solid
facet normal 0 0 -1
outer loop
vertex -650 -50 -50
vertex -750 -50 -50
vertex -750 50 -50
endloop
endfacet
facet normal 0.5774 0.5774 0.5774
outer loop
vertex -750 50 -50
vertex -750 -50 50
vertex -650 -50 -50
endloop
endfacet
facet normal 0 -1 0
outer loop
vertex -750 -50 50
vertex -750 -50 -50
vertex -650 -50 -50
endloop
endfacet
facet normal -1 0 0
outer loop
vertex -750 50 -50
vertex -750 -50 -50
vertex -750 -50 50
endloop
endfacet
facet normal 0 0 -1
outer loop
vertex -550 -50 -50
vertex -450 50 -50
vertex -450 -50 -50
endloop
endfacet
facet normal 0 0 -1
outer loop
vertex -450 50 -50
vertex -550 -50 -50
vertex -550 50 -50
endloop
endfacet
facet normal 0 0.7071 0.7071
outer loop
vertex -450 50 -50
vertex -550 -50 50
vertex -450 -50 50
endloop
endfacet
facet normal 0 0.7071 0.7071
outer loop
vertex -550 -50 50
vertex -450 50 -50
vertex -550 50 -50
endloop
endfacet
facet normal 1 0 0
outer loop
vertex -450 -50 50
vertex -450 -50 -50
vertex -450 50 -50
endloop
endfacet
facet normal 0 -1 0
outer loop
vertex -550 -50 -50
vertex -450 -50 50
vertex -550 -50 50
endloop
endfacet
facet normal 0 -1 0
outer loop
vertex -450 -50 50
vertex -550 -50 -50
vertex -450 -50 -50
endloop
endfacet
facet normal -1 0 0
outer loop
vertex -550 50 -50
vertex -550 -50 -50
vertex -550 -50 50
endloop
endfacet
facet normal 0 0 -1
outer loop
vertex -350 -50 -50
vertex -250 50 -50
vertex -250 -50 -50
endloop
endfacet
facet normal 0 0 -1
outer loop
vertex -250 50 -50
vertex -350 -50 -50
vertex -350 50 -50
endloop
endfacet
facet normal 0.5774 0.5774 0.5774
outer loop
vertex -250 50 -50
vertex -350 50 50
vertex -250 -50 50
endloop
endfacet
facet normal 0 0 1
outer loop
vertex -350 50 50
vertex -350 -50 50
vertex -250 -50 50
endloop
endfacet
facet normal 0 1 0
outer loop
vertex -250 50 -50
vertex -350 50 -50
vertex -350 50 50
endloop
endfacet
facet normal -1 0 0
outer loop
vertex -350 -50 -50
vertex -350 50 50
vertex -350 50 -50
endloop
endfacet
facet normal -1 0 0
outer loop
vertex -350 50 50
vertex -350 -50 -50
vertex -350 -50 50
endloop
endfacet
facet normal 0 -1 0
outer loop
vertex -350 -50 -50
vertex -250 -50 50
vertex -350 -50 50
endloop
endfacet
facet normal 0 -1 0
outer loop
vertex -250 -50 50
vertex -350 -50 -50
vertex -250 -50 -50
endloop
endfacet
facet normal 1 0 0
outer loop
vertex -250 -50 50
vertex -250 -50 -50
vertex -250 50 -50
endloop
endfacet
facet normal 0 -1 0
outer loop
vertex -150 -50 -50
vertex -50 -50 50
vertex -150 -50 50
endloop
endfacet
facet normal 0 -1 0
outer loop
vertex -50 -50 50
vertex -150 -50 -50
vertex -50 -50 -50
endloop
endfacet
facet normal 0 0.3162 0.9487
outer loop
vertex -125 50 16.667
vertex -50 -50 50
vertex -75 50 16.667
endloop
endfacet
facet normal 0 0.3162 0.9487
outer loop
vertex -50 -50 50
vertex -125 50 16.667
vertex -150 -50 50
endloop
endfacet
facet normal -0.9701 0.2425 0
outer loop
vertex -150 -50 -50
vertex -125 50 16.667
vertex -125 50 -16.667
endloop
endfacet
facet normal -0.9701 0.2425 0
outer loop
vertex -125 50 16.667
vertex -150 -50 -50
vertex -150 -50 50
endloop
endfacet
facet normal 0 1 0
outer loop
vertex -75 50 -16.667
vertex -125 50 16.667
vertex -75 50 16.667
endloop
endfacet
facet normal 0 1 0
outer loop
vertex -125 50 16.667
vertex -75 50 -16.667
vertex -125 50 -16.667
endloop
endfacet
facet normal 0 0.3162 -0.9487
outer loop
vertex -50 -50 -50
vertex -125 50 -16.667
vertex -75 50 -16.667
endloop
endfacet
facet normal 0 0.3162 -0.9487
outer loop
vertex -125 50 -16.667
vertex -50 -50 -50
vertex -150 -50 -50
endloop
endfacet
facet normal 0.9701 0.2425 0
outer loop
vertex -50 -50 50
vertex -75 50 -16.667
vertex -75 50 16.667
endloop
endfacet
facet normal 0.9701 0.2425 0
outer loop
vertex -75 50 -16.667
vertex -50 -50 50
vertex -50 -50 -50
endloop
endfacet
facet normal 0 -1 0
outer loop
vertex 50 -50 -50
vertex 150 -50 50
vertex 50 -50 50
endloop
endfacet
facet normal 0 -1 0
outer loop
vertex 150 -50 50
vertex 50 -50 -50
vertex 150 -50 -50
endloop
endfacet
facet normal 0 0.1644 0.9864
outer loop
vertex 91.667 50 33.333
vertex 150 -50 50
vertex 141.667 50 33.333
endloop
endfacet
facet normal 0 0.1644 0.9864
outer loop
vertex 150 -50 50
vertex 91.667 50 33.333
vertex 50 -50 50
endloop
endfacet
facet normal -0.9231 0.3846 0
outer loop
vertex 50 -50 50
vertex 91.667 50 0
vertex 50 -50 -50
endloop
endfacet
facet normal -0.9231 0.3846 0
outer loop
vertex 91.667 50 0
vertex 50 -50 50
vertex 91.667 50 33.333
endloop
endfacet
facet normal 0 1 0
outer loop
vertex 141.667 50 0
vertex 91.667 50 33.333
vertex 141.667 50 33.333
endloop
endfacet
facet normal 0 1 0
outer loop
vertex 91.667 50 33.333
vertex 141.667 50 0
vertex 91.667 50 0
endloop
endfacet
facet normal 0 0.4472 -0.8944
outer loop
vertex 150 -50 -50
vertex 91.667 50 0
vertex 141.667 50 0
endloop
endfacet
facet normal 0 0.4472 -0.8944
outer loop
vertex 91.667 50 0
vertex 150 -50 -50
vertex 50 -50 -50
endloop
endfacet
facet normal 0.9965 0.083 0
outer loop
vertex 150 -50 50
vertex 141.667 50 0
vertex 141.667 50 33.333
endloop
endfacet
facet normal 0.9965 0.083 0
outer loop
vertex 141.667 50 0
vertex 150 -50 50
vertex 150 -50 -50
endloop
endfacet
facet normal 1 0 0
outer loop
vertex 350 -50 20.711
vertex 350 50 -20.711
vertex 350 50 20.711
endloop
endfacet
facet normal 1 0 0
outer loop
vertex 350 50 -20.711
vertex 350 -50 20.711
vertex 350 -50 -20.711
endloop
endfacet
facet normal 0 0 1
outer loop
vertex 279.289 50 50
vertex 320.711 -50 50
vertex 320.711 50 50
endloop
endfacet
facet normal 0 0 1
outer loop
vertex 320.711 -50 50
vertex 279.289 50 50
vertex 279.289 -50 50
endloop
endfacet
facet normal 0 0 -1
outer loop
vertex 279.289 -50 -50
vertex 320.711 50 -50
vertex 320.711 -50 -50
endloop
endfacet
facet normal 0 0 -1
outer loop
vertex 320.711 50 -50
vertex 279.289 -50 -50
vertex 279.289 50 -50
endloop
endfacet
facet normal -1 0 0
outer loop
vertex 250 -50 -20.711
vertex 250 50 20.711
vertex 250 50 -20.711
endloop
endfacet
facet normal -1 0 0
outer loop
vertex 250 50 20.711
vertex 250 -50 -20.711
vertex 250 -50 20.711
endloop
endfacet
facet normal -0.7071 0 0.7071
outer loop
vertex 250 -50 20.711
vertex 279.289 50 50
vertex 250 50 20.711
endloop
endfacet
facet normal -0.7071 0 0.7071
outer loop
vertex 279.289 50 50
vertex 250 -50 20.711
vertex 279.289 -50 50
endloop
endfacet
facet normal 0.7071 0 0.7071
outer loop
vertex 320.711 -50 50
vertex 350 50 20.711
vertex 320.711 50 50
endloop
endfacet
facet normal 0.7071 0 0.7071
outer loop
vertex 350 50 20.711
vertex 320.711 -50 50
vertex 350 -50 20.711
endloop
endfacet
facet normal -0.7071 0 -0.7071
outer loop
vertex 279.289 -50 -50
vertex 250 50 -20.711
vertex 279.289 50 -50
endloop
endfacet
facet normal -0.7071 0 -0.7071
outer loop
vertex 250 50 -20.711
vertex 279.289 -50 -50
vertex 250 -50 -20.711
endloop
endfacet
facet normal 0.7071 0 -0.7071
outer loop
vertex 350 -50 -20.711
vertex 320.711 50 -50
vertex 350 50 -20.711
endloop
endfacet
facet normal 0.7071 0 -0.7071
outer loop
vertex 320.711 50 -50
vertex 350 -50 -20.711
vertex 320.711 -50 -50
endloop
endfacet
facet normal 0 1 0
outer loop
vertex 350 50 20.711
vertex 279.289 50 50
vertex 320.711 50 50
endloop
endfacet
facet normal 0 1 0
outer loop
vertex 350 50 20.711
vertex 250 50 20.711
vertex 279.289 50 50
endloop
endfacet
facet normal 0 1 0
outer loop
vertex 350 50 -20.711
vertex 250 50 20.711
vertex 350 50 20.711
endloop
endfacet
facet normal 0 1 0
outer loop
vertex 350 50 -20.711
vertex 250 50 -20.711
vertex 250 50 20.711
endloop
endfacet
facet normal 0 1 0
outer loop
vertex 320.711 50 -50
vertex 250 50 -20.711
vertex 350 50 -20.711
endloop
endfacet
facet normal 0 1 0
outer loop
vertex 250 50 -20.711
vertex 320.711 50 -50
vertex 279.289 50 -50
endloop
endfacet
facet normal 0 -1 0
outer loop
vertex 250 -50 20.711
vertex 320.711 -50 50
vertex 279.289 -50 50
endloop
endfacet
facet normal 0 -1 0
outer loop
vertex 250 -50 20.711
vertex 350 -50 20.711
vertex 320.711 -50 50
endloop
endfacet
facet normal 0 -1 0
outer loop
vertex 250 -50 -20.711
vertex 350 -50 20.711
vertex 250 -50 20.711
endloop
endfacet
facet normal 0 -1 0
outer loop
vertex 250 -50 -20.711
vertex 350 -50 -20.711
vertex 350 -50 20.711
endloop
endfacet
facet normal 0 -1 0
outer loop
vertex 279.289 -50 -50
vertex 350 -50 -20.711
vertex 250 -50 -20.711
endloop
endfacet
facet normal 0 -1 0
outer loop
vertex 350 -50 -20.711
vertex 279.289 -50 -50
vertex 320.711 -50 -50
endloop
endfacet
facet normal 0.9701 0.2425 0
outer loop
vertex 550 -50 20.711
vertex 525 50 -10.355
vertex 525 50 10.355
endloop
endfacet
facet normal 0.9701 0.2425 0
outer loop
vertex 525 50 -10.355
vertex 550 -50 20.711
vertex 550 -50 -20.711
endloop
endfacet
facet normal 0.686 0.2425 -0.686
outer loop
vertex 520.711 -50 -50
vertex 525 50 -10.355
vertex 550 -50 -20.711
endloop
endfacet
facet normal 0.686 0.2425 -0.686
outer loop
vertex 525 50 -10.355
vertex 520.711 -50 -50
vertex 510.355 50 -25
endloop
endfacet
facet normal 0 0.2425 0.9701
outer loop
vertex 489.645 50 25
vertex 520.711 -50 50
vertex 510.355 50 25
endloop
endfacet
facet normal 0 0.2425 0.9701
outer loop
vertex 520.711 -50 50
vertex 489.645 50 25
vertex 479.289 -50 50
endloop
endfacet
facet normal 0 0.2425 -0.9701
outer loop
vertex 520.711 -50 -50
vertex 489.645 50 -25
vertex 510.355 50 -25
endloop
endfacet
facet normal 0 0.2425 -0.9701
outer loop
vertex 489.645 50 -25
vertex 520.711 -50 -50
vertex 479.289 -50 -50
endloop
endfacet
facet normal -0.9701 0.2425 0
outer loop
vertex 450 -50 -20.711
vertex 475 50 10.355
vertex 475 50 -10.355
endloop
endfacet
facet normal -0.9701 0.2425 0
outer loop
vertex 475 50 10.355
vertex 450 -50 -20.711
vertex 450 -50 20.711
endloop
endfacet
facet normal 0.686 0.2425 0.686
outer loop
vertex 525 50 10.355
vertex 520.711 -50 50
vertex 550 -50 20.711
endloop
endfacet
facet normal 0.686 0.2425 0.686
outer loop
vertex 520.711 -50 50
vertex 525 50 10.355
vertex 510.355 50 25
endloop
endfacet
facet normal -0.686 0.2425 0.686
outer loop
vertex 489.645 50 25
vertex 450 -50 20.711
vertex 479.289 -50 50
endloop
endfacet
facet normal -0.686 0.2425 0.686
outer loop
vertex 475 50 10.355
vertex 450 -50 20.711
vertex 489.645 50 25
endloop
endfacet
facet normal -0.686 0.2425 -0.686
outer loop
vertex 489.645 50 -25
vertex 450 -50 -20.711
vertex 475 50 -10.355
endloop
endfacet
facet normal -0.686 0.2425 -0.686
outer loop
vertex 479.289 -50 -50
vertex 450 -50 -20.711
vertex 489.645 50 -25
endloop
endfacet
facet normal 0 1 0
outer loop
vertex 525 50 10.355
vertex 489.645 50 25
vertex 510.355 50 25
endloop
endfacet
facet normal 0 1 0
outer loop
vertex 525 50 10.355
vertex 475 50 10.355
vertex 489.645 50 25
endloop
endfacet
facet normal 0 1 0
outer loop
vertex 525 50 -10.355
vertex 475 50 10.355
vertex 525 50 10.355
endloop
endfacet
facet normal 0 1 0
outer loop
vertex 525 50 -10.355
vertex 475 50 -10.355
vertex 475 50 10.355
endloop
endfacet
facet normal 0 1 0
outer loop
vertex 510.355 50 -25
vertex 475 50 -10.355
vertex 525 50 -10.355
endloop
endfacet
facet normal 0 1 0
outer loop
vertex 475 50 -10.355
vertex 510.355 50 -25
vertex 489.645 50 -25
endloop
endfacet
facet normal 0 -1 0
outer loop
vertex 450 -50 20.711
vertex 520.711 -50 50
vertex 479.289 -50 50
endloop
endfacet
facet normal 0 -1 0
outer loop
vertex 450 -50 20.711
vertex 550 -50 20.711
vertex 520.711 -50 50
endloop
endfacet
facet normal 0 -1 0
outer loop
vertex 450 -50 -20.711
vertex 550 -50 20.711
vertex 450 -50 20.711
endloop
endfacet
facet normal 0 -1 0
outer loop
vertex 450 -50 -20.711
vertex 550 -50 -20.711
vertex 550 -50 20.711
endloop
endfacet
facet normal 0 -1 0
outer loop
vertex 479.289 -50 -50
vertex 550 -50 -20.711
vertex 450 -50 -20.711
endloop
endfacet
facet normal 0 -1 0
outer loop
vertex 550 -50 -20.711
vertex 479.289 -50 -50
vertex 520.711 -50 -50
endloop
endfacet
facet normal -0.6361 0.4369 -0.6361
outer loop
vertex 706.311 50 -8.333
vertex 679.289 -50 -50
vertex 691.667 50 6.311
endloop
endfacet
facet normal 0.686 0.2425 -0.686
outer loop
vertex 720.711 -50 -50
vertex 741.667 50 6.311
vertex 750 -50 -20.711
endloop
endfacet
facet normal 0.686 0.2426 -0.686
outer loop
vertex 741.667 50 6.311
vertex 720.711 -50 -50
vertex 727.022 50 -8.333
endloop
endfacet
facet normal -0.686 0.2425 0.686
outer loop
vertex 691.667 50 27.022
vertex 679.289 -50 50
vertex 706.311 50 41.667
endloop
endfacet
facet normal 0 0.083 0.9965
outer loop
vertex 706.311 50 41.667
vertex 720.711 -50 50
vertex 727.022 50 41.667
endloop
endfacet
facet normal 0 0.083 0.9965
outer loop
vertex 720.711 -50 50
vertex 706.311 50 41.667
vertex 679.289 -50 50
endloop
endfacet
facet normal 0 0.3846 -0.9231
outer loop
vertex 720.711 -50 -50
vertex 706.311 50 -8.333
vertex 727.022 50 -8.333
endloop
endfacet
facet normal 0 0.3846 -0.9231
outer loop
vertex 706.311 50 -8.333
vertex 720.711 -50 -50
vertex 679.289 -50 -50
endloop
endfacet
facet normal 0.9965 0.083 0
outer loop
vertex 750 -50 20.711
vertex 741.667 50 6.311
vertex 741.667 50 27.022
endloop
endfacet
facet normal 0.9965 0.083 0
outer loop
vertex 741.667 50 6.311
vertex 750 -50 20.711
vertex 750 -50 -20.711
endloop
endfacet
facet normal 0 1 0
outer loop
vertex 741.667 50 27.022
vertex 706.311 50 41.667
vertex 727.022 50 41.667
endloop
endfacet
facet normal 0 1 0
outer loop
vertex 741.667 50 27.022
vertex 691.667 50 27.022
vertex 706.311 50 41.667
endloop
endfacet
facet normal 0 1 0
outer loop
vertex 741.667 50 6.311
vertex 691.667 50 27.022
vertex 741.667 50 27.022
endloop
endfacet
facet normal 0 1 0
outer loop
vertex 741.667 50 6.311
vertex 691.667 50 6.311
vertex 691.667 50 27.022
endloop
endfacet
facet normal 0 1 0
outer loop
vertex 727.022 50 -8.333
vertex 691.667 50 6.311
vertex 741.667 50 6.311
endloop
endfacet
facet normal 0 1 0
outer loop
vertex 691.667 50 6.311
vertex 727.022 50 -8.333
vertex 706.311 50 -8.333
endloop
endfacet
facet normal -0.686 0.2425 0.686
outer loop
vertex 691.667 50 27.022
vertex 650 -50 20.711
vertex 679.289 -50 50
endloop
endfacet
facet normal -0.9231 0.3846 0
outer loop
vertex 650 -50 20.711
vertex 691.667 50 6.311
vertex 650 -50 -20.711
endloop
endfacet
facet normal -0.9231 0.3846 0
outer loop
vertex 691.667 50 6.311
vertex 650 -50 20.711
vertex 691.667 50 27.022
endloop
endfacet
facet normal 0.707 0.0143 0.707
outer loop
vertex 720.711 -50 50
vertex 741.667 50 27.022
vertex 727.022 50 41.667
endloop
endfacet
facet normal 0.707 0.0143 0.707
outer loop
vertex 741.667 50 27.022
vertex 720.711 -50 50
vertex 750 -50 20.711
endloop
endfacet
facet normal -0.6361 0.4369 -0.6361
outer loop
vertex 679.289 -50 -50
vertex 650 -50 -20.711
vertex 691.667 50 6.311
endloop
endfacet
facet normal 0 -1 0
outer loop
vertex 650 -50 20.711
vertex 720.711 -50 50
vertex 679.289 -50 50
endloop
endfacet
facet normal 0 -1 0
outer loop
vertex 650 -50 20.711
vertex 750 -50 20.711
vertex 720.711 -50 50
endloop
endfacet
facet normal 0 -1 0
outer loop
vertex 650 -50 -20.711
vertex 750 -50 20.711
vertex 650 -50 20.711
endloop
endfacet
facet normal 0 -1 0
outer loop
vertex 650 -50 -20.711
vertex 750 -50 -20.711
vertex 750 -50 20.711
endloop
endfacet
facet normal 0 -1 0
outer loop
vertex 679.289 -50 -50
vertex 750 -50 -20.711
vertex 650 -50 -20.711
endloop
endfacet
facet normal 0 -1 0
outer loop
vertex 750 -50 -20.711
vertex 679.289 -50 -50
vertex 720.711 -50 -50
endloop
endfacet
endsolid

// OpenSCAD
// basic shapes and a demo at the end

module sixth_cube() {
    /*
    like a unit cube centred at [0, 0, 0]
    but 5/6 sliced away from top front right along 3 vertices;
    faces:
        3 isosceles right triangles
        1 equilateral     triangle
    */
    a = 1/2;
    polyhedron(
        [
            [-a, -a, -a],
            [ a, -a, -a],
            [-a,  a, -a],
            [-a, -a,  a],
        ],
        [
            [0, 1, 2],
            [0, 2, 3],
            [0, 3, 1],
            [1, 3, 2],
        ]
    );
}

module half_cube() {
    /*
    like a unit cube centred at [0, 0, 0]
    but 1/2 sliced away from top front along 4 vertices;
    faces:
        2 squares
        1 rectangle
        2 isosceles right triangles
    */
    a = 1/2;
    polyhedron(
        [
            [-a, -a, -a],
            [ a, -a, -a],
            [-a,  a, -a],
            [ a,  a, -a],
            [-a, -a,  a],
            [ a, -a,  a],
        ],
        [
            [0, 1, 3, 2],
            [0, 2, 4],
            [0, 4, 5, 1],
            [1, 5, 3],
            [2, 3, 5, 4],
        ]
    );
}

module five_sixths_cube() {
    /*
    like a unit cube centred at [0, 0, 0]
    but 1/6 sliced away from top front right along 3 vertices;
    faces:
        3 squares
        3 isosceles right triangles
        1 equilateral     triangle
    */
    a = 1/2;
    polyhedron(
        [
            [-a, -a, -a],
            [ a, -a, -a],
            [-a,  a, -a],
            [ a,  a, -a],
            [-a, -a,  a],
            [ a, -a,  a],
            [-a,  a,  a],
        ],
        [
            [0, 1, 3, 2],
            [0, 2, 6, 4],
            [0, 4, 5, 1],
            [1, 5, 3],
            [2, 3, 6],
            [3, 5, 6],
            [4, 6, 5],
        ]
    );
}

module right_rect_frustum(fw, fh) {
    /*
    a right frustum of a rectangular pyramid
    (a right rectangular pyramid cut by a plane parallel to the base);
    base towards viewer;
    four of the faces are vertical;
    rear width = rear height = length = 1;
    centered at [0, 0, 0];
    faces:
        2 rectangles (front and rear)
        4 trapezoids
    args:
        fw = front width
        fh = front height
    */
    polyhedron(
        [
            // rear
            [ -1/2, -1/2,  -1/2],
            [ -1/2, -1/2,   1/2],
            [  1/2, -1/2,   1/2],
            [  1/2, -1/2,  -1/2],
            // front
            [-fw/2,  1/2, -fh/2],
            [-fw/2,  1/2,  fh/2],
            [ fw/2,  1/2,  fh/2],
            [ fw/2,  1/2, -fh/2],
        ],
        [
            [0, 1, 2, 3],
            [0, 4, 5, 1],
            [1, 5, 6, 2],
            [2, 6, 7, 3],
            [3, 7, 4, 0],
            [4, 7, 6, 5],
        ]
    );
}


module rect_frustum(fw, fh, fx, fz) {
    /*
    a frustum of a rectangular pyramid
    (a rectangular pyramid cut by a plane parallel to the base);
    base towards viewer;
    four of the faces are vertical;
    rear width = rear height = length = 1;
    centered at [0, 0, 0] but X & Z centering is based on rear face only;
    faces:
        2 rectangles (front and rear)
        4 trapezoids
    args:
        fw = front width
        fh = front height
        fx = front X offset from centerline
        fz = front Z offset from centerline
    */
    polyhedron(
        [
            // rear
            [   -1/2, -1/2,    -1/2],
            [   -1/2, -1/2,     1/2],
            [    1/2, -1/2,     1/2],
            [    1/2, -1/2,    -1/2],
            // front
            [fx-fw/2,  1/2, fz-fh/2],
            [fx-fw/2,  1/2, fz+fh/2],
            [fx+fw/2,  1/2, fz+fh/2],
            [fx+fw/2,  1/2, fz-fh/2],
        ],
        [
            [0, 1, 2, 3],
            [0, 4, 5, 1],
            [1, 5, 6, 2],
            [2, 6, 7, 3],
            [3, 7, 4, 0],
            [4, 7, 6, 5],
        ]
    );
}

module oct_prism() {
    /*
    a right octagonal prism;
    distance between any two parallel faces = 1;
    centred at [0, 0, 0];
    faces:
        2 regular octagons (front and rear)
        8 rectangles
    base towards viewer
    */
    a = 1/(2+2*sqrt(2));  // small
    b = 1/2;              // big
    polyhedron(
        [
            // rear
            [-b, -b, -a],
            [-b, -b,  a],
            [-a, -b,  b],
            [ a, -b,  b],
            [ b, -b,  a],
            [ b, -b, -a],
            [ a, -b, -b],
            [-a, -b, -b],
            // front
            [-b,  b, -a],
            [-b,  b,  a],
            [-a,  b,  b],
            [ a,  b,  b],
            [ b,  b,  a],
            [ b,  b, -a],
            [ a,  b, -b],
            [-a,  b, -b],
        ],
        [
            [ 0,  1,  2,  3,  4,  5, 6, 7],
            [15, 14, 13, 12, 11, 10, 9, 8],
            [ 0,  8,  9,  1],
            [ 1,  9, 10,  2],
            [ 2, 10, 11,  3],
            [ 3, 11, 12,  4],
            [ 4, 12, 13,  5],
            [ 5, 13, 14,  6],
            [ 6, 14, 15,  7],
            [ 7, 15,  8,  0],
        ]
    );
}

module right_oct_frustum(fs) {
    /*
    a right frustum of an octagonal pyramid;
    centred at [0, 0, 0];
    base towards viewer;
    front and rear faces: two vertical regular octagons
    with width = height = Y distance = 1;
    other faces: eight trapezoids;
    same as octagonal prism if fs = 1;
    faces:
        2 regular octagons (front and rear)
        8 trapezoids
    args:
        fs = front width & height scale factor
    note: front face must have same width/height ratio as rear face;
    otherwise side faces would not be planes
    */
    ra =  1/(2+2*sqrt(2));  // rear  small
    fa = fs/(2+2*sqrt(2));  // front small
    y  =  1/2;
    rb =  1/2;              // rear  big
    fb = fs/2;              // front big
    polyhedron(
        [
            // rear
            [-rb, -y, -ra],
            [-rb, -y,  ra],
            [-ra, -y,  rb],
            [ ra, -y,  rb],
            [ rb, -y,  ra],
            [ rb, -y, -ra],
            [ ra, -y, -rb],
            [-ra, -y, -rb],
            // front
            [-fb,  y, -fa],
            [-fb,  y,  fa],
            [-fa,  y,  fb],
            [ fa,  y,  fb],
            [ fb,  y,  fa],
            [ fb,  y, -fa],
            [ fa,  y, -fb],
            [-fa,  y, -fb],
        ],
        [
            [ 0,  1,  2,  3,  4,  5, 6, 7],
            [15, 14, 13, 12, 11, 10, 9, 8],
            [ 0,  8,  9,  1],
            [ 1,  9, 10,  2],
            [ 2, 10, 11,  3],
            [ 3, 11, 12,  4],
            [ 4, 12, 13,  5],
            [ 5, 13, 14,  6],
            [ 6, 14, 15,  7],
            [ 7, 15,  8,  0],
        ]
    );
}

module oct_frustum(fs, fx, fz) {
    /*
    a frustum of an octagonal pyramid;
    centred at [0, 0, 0] (if fx = fz = 0);
    base towards viewer;
    front and rear faces: two vertical regular octagons
    with width = height = Y distance = 1;
    other faces: eight trapezoids;
    same as the octagonal prism if fs = 1 and fx = fz = 0;
    faces:
        2 regular octagons (front and rear)
        8 trapezoids
    args:
        fs = front width & height scale factor
        fx = front X offset from centreline
        fz = front Z offset from centreline
    note: front face must have same width/height ratio as rear face;
    otherwise side faces would not be planes
    */
    ra =  1/(2+2*sqrt(2));  // rear  small
    fa = fs/(2+2*sqrt(2));  // front small
    y  =  1/2;
    rb =  1/2;              // rear  big
    fb = fs/2;              // front big
    polyhedron(
        [
            // rear
            [  -rb, -y,   -ra],
            [  -rb, -y,    ra],
            [  -ra, -y,    rb],
            [   ra, -y,    rb],
            [   rb, -y,    ra],
            [   rb, -y,   -ra],
            [   ra, -y,   -rb],
            [  -ra, -y,   -rb],
            // front
            [fx-fb,  y, fz-fa],
            [fx-fb,  y, fz+fa],
            [fx-fa,  y, fz+fb],
            [fx+fa,  y, fz+fb],
            [fx+fb,  y, fz+fa],
            [fx+fb,  y, fz-fa],
            [fx+fa,  y, fz-fb],
            [fx-fa,  y, fz-fb],
        ],
        [
            [ 0,  1,  2,  3,  4,  5, 6, 7],
            [15, 14, 13, 12, 11, 10, 9, 8],
            [ 0,  8,  9,  1],
            [ 1,  9, 10,  2],
            [ 2, 10, 11,  3],
            [ 3, 11, 12,  4],
            [ 4, 12, 13,  5],
            [ 5, 13, 14,  6],
            [ 6, 14, 15,  7],
            [ 7, 15,  8,  0],
        ]
    );
}

// demo
scale(100) {
    translate([-7, 0, 0]) sixth_cube();
    translate([-5, 0, 0]) half_cube();
    translate([-3, 0, 0]) five_sixths_cube();
    translate([-1, 0, 0]) right_rect_frustum(1/2, 1/3);
    translate([ 1, 0, 0]) rect_frustum(1/2, 1/3, 1/6, 1/6);
    translate([ 3, 0, 0]) oct_prism();
    translate([ 5, 0, 0]) right_oct_frustum(1/2);
    translate([ 7, 0, 0]) oct_frustum(1/2, 1/6, 1/6);
}
